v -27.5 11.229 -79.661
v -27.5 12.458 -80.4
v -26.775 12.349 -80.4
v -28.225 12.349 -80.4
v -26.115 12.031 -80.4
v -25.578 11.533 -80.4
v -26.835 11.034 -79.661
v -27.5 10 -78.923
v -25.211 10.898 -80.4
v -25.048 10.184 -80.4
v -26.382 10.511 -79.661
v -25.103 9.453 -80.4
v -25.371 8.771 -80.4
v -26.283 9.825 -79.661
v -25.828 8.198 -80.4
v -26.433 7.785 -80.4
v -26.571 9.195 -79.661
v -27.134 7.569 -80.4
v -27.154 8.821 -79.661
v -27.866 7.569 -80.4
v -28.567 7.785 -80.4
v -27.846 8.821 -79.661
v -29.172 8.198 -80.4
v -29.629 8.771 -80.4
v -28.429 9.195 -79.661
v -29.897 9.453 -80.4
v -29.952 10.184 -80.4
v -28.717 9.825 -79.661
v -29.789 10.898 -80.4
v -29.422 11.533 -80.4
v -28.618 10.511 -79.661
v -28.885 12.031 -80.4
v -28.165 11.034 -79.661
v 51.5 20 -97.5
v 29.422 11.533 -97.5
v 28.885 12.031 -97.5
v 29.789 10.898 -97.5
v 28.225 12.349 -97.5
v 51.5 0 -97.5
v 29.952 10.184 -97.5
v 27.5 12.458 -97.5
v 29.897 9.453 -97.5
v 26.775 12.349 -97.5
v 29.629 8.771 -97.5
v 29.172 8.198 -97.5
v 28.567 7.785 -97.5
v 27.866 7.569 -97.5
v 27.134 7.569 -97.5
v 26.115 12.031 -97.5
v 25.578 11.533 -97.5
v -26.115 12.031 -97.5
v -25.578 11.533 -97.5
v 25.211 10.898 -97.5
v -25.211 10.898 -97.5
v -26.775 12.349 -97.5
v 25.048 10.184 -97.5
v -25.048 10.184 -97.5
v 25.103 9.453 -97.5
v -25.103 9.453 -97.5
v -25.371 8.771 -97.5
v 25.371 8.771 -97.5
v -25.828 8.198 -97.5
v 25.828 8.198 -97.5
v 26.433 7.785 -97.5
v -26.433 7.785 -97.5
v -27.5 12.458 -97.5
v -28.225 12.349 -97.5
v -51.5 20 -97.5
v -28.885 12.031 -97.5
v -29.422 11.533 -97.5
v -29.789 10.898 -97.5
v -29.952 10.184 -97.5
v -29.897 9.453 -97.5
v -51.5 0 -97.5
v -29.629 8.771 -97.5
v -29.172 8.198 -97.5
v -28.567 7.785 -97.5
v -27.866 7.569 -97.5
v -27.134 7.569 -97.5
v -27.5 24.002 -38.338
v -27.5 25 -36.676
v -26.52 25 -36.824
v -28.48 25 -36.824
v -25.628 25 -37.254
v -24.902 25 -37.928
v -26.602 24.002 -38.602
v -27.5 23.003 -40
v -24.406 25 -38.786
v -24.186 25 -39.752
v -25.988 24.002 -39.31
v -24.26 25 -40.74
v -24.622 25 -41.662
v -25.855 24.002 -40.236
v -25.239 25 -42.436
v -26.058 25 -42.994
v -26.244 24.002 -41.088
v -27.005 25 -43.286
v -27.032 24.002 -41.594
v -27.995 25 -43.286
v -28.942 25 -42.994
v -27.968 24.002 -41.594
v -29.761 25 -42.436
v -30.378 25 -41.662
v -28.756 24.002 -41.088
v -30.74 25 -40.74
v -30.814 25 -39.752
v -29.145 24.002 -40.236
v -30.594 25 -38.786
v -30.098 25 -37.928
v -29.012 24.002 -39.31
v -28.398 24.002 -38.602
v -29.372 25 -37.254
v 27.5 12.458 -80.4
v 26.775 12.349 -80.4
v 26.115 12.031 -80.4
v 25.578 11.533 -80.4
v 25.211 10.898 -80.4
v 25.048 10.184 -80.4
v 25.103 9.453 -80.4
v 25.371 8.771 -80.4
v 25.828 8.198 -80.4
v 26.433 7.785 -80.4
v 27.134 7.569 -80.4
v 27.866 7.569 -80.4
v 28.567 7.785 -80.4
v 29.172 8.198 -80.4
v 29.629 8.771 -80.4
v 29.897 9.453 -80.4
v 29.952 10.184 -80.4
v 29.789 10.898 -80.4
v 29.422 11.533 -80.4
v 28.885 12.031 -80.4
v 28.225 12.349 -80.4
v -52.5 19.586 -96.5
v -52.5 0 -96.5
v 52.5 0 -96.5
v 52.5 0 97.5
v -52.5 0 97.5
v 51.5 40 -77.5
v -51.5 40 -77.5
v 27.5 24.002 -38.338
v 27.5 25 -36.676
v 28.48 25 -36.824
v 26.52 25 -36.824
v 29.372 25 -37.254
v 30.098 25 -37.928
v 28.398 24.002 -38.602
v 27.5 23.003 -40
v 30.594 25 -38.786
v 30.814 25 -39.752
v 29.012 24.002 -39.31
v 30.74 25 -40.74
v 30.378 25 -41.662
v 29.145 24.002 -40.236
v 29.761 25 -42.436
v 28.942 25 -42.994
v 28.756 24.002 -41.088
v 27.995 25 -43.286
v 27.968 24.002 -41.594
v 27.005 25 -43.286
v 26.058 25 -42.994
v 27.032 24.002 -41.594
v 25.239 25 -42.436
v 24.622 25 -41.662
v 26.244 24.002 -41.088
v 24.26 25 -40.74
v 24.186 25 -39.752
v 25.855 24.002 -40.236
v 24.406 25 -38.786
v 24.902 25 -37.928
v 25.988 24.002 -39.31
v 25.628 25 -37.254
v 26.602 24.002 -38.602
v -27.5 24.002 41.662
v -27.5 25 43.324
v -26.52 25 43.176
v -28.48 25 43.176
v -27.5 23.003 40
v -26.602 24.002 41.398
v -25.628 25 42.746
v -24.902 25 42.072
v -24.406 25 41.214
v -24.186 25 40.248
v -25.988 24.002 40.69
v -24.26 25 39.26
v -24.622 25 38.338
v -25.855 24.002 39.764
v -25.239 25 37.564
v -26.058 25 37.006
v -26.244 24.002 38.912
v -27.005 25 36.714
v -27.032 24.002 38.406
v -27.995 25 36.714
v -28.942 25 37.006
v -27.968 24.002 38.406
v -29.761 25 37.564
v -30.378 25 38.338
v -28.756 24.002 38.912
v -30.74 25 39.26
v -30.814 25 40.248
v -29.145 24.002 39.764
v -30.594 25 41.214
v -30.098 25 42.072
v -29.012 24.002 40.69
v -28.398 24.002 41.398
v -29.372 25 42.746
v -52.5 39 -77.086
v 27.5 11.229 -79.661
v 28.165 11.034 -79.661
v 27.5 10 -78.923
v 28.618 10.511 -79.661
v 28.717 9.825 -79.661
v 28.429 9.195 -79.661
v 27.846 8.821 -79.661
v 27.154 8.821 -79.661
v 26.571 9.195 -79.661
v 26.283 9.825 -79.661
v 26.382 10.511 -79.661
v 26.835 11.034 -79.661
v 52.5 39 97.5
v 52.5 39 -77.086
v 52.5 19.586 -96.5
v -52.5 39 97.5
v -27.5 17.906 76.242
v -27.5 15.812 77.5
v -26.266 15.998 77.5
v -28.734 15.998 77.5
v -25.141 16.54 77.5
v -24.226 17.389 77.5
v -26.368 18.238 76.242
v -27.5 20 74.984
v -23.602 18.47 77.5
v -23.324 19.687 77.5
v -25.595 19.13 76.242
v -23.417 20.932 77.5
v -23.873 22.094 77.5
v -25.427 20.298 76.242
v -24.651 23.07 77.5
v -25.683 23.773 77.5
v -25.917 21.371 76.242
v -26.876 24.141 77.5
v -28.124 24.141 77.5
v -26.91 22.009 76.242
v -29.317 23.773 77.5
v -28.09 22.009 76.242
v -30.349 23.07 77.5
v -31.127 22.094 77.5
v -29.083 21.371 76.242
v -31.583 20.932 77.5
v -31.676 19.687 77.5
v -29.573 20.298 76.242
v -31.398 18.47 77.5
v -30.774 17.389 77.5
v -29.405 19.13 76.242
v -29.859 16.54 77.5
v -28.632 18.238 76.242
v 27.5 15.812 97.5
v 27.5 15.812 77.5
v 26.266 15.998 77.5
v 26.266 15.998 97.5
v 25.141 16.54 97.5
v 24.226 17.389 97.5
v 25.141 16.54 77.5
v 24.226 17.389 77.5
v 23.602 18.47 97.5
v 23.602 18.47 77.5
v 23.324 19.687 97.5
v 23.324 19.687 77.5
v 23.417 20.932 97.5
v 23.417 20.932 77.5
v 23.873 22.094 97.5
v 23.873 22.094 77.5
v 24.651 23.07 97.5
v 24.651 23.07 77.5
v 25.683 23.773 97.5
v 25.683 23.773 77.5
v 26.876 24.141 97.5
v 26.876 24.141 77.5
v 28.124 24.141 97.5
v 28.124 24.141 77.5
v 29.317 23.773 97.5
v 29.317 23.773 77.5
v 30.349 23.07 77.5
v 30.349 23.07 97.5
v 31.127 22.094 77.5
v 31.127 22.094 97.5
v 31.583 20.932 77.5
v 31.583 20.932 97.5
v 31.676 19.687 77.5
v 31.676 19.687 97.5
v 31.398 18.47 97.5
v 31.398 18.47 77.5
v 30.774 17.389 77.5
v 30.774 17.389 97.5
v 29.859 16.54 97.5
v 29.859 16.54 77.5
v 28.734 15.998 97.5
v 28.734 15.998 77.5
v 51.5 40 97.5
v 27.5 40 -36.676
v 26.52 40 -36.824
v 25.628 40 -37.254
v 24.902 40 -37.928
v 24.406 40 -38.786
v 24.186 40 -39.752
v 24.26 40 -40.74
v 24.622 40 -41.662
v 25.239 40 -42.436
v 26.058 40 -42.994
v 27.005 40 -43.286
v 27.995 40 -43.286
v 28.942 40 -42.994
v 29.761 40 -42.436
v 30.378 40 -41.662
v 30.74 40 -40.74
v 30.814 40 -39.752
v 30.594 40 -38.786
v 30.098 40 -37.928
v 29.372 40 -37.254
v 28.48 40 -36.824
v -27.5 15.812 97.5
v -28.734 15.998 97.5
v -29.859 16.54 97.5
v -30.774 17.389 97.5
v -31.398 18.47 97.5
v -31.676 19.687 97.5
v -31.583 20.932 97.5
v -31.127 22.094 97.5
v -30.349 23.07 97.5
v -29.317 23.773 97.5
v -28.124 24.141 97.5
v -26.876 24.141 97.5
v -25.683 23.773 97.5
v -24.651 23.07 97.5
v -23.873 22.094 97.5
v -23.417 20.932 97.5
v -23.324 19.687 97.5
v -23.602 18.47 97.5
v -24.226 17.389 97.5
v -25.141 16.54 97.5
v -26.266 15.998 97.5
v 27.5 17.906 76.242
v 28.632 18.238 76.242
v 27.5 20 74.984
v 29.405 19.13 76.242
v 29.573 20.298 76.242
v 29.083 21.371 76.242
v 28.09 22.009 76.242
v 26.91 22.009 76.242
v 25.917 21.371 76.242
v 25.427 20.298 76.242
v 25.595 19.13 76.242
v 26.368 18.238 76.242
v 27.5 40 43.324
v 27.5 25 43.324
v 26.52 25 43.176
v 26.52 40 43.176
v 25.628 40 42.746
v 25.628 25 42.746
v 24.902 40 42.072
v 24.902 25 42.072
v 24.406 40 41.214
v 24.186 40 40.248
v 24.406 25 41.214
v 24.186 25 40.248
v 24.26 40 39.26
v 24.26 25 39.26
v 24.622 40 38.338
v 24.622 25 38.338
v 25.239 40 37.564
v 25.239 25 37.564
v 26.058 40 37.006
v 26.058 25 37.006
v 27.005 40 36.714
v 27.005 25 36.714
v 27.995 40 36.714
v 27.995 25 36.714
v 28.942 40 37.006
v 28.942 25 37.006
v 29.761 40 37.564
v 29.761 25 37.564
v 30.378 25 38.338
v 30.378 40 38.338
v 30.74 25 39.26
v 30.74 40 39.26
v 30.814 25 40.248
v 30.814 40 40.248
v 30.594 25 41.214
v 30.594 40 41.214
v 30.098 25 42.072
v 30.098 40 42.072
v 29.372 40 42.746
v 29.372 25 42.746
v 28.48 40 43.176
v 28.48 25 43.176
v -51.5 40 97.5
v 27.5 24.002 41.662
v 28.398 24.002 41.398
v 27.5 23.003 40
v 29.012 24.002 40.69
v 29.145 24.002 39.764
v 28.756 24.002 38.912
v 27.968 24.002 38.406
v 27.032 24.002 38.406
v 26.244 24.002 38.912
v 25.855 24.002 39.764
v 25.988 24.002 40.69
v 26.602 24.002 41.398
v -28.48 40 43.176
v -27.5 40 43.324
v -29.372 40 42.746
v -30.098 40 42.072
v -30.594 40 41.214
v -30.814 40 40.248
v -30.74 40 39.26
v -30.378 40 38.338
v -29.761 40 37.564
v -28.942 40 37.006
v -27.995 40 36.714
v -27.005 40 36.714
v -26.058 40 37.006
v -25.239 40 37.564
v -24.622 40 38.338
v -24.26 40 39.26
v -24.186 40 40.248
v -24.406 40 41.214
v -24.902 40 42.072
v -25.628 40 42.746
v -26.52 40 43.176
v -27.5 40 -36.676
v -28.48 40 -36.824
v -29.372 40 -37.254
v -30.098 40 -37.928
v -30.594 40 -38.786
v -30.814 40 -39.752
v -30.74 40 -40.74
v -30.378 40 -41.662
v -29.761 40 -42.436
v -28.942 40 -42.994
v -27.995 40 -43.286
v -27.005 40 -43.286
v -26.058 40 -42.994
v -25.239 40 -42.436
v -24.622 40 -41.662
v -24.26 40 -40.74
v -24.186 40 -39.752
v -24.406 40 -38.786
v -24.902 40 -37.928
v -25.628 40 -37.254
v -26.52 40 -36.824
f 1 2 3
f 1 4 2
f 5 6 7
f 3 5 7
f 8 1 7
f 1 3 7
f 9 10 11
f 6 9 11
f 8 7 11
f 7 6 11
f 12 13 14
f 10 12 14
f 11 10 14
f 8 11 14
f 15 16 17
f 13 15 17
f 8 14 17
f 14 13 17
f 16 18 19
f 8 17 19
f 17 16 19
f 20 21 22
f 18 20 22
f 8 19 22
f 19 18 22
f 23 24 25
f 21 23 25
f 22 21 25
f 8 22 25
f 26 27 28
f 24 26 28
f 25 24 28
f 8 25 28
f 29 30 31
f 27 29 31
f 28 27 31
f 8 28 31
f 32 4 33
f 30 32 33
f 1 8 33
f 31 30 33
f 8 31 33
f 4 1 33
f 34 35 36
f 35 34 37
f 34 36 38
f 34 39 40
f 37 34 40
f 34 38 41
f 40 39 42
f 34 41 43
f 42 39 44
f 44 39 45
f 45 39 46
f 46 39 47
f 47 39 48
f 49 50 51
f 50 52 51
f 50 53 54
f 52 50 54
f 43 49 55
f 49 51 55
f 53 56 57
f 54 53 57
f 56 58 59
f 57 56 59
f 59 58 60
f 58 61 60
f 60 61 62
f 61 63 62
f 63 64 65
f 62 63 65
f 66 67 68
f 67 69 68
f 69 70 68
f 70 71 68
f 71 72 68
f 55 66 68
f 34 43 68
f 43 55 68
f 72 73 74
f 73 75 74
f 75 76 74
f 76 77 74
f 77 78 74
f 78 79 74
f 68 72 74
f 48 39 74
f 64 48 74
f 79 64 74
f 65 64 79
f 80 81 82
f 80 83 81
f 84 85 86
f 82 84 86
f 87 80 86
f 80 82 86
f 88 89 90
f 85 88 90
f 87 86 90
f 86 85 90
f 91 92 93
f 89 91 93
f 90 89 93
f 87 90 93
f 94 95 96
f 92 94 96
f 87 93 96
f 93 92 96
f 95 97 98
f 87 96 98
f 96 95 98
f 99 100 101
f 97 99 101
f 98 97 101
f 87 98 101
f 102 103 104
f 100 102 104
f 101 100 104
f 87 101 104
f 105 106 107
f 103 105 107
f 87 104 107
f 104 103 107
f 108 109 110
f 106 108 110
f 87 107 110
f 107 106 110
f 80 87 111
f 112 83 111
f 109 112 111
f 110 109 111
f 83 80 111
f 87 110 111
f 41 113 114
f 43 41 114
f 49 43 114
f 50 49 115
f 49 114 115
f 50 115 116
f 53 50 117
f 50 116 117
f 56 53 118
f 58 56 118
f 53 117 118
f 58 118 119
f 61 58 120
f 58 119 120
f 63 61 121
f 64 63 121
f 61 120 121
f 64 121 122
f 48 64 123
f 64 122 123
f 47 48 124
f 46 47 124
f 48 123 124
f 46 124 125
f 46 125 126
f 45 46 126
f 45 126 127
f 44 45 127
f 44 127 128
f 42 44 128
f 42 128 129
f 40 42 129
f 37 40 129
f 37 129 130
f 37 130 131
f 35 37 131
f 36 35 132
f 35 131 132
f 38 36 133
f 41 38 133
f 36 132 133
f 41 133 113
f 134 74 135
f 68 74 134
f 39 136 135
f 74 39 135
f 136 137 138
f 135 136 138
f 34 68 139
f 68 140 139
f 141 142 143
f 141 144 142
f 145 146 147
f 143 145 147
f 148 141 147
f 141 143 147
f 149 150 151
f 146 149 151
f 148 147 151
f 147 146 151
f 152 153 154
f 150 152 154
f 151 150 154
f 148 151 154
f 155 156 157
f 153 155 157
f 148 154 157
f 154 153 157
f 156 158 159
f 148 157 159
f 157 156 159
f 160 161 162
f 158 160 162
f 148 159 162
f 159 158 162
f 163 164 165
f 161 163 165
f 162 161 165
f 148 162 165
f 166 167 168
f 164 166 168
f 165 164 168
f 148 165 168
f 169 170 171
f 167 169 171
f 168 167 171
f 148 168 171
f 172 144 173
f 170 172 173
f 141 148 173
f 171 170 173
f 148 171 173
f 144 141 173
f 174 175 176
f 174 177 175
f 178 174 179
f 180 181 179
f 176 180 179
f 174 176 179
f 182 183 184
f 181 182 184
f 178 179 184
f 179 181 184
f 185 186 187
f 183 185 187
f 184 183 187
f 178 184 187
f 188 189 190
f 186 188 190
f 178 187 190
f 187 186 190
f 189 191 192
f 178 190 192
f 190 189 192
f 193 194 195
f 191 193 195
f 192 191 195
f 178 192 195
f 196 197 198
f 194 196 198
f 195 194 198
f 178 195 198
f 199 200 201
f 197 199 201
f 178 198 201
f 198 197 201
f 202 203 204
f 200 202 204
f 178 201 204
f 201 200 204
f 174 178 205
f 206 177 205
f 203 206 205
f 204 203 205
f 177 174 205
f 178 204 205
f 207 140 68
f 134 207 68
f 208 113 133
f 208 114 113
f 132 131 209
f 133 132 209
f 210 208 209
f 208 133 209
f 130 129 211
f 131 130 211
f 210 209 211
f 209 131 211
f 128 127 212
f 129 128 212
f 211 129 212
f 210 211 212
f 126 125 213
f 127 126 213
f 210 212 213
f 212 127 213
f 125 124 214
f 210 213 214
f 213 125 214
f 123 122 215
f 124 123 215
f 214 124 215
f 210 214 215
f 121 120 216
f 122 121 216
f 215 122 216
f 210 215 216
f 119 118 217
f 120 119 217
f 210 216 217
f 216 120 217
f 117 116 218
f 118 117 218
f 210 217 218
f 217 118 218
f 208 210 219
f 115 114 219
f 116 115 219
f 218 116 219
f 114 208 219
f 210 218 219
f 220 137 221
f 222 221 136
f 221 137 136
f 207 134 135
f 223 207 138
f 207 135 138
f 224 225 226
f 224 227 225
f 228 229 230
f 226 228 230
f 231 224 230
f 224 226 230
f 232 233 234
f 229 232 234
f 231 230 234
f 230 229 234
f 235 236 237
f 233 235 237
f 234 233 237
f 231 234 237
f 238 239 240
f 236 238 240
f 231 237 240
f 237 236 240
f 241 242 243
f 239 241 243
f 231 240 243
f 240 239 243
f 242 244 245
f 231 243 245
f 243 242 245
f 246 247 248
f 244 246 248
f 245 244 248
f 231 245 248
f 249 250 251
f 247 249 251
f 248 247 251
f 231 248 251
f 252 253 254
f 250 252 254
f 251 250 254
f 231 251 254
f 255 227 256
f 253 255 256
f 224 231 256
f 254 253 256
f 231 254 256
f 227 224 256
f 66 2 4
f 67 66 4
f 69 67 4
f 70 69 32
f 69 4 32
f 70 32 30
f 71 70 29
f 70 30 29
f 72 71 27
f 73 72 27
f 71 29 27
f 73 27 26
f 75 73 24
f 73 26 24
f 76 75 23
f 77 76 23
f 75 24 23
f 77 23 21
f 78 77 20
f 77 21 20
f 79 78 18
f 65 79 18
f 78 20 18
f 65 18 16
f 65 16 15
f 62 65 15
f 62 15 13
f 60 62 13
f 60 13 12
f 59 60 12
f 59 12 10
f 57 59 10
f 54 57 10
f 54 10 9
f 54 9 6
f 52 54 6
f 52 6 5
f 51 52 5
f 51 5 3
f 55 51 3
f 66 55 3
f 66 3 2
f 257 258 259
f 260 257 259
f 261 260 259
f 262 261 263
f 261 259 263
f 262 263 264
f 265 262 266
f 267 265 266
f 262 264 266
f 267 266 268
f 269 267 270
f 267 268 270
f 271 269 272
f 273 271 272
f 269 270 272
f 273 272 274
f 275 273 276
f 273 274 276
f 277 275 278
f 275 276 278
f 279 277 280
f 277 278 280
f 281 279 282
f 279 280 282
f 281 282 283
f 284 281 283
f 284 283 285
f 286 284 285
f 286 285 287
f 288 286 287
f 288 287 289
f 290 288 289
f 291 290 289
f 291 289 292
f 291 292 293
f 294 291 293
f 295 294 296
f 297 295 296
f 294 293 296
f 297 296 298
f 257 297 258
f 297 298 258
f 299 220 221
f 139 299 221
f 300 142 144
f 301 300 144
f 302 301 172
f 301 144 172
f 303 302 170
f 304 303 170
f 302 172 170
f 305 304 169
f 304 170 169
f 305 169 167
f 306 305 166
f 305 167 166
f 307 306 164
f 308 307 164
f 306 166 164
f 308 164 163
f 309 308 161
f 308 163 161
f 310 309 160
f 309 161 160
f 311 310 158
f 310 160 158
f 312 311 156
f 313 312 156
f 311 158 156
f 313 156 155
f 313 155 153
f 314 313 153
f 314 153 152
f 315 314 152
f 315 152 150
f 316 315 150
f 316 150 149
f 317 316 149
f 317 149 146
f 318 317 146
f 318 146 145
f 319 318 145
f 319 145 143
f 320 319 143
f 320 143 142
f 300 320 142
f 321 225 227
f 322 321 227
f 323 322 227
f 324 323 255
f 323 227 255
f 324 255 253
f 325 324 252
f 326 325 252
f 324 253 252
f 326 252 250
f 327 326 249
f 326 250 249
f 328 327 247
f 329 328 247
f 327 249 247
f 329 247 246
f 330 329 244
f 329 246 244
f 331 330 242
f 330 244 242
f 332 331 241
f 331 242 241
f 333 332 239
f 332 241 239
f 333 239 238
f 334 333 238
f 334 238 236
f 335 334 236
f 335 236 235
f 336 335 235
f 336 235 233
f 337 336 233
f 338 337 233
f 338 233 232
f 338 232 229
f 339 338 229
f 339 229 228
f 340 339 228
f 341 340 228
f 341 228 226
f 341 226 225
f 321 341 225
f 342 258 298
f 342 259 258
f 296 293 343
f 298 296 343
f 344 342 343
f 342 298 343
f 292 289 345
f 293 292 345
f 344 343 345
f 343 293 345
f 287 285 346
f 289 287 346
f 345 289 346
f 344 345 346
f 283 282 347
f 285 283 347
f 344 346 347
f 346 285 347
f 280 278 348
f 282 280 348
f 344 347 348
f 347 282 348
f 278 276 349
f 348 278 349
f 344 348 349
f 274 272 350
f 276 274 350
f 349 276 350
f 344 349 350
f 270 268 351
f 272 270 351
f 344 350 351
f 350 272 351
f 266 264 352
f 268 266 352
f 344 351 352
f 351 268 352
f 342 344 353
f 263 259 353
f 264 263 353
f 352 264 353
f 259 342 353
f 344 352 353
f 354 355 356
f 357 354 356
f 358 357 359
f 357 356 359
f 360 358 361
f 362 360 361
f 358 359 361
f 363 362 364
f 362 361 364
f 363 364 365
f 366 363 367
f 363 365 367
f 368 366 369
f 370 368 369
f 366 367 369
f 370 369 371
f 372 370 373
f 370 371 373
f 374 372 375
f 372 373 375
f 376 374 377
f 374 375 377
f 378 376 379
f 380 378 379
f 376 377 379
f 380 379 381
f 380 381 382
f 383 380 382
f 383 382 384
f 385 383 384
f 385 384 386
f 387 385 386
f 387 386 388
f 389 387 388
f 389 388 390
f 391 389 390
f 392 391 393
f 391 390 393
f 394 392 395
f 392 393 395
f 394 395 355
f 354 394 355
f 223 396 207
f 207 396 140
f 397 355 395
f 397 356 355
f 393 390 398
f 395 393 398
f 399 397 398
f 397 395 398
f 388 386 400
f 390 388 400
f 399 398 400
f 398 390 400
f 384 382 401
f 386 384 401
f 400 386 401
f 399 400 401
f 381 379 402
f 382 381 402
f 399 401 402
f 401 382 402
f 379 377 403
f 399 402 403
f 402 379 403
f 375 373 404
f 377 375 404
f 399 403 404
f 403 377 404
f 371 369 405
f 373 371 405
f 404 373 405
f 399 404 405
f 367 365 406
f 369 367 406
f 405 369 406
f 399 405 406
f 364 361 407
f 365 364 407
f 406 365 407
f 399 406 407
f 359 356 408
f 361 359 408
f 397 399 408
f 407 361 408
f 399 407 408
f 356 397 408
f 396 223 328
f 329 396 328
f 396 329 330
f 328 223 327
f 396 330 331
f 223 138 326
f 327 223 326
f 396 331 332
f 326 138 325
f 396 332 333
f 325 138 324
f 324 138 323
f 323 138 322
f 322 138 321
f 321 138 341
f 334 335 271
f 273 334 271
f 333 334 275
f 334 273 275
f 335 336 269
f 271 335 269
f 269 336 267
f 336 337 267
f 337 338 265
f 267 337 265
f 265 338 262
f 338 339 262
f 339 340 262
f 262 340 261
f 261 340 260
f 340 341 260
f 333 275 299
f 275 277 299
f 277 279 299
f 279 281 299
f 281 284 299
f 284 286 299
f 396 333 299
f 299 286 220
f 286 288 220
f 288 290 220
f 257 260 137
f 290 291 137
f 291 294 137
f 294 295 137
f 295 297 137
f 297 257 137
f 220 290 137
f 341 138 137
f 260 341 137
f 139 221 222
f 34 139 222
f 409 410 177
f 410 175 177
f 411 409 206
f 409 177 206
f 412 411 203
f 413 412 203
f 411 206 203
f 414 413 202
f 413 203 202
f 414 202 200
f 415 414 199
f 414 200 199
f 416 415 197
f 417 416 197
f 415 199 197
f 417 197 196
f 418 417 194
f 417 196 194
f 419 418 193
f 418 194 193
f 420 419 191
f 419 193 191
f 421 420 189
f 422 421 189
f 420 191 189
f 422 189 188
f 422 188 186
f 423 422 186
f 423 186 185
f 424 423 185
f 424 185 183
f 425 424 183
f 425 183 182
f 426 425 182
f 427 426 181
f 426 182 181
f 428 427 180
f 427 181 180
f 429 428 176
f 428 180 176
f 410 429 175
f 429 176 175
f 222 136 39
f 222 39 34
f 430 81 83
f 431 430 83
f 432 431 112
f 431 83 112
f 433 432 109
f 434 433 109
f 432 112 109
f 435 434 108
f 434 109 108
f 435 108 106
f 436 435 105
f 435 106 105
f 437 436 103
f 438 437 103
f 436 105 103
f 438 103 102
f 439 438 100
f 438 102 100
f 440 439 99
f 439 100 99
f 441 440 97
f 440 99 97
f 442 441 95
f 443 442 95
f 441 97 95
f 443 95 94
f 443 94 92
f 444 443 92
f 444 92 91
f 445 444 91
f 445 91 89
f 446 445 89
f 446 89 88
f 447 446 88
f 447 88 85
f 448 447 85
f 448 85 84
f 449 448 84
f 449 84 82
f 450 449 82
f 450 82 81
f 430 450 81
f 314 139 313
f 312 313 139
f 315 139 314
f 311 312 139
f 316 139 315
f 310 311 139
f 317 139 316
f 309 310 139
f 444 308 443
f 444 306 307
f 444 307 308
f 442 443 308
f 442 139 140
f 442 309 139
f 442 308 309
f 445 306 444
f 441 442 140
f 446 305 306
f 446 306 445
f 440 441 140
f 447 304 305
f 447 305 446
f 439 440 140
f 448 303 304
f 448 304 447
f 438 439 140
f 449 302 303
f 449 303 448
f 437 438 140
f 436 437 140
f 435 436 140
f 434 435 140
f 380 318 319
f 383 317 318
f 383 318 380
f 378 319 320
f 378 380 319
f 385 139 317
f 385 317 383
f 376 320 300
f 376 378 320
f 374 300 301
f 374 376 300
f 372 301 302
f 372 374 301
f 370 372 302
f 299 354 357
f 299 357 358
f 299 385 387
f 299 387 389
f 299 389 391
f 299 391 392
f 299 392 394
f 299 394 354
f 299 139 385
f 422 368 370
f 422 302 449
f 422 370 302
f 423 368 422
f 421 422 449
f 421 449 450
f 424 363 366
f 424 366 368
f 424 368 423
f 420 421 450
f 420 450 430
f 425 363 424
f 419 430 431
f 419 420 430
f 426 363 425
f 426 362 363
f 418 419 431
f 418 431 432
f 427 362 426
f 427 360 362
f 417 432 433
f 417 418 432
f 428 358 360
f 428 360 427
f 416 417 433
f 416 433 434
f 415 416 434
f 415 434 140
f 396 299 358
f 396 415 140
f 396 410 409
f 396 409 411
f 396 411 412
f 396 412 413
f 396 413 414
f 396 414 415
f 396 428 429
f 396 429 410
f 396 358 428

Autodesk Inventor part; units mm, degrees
ref_plane "YZ Plane" through (0, 0, 0) normal (1, 0, 0) x (0, 1, 0)
ref_plane "XZ Plane" through (0, 0, 0) normal (0, 1, 0) x (-1, 0, 0)
ref_plane "XY Plane" through (0, 0, 0) normal (0, 0, 1) x (1, 0, 0)
sketch "Sketch1" plane through (0, 0, 0) normal (0, 1, 0) x (-1, 0, 0)
  line L0 (52.5, 97.5) -> (-52.5, 97.5)
  line L1 (-52.5, 97.5) -> (-52.5, -97.5)
  line L2 (-52.5, -97.5) -> (52.5, -97.5)
  line L3 (52.5, -97.5) -> (52.5, 97.5)
  point P0 (0, 0)
  point P1 (0, -97.5)
  point P2 (-52.5, 0)
  dimension "d0" = 105
  dimension "d1" = 195
extrude "Extrusion1" add sketch "Sketch1" along normal blind 40
sketch "Sketch2" plane through (-52.5, 0, 97.5) normal (0, 0, 1) x (1, 0, 0)
  line L0 (0, 40) -> (105, 40)
  circle A0 centre (80, 20) radius 5
  circle A1 centre (25, 20) radius 5
  line L1 (105, 0) -> (105, 40) projected
  line L2 (0, 0) -> (105, 0) projected
  line L3 (52.5, 0) -> (52.5, -9.2371) construction
  point P0 (105, 20)
  dimension "d6" = 55
  dimension "d19" = 10
  dimension "d44" = 27.5
hole "Hole1" at (27.5, 20, 97.5) at (-27.5, 20, 97.5) direction (0, 0, -1) diameter 8.376 depth 20 tip angle 118 thread size "M10x1.5" class "6H" standard "ANSI Metric M Profile"
chamfer "Chamfer1" distance 20 angle 45 1 edges at (0, 40, -97.5)
sketch "Sketch3" plane through (52.5, 0, -97.5) normal (0, 0, -1) x (-1, 0, 0)
  line L0 (0, 20) -> (105, 20) projected
  line L1 (0, 0) -> (105, 0) projected
  circle A0 centre (25, 10) radius 4
  circle A1 centre (80, 10) radius 4
  point P0 (52.5, 0)
  dimension "d20" = 55
  dimension "d21" = 27.5
  dimension "d22" = 20
  dimension "d23" = 10
  dimension "d24" = 8
hole "Hole2" at (27.5, 10, -97.5) at (-27.5, 10, -97.5) direction (0, 0, 1) diameter 4.917 depth 17.1 tip angle 118 thread size "M6x1" class "6H" standard "ISO Metric profile"
sketch "Sketch4" plane through (0, 40, 0) normal (0, 1, 0) x (1, 0, 0)
  circle A0 centre (-27.5, 40) radius 4
  circle A1 centre (27.5, 40) radius 4
  circle A2 centre (-27.5, -40) radius 4
  circle A3 centre (27.5, -40) radius 4
  line L0 (-52.5, -97.5) -> (52.5, -97.5) projected
  point P0 (0, 0)
  dimension "d32" = 8
  dimension "d33" = 55
  dimension "d34" = 27.5
  dimension "d35" = 80
  dimension "d46" = 57.5
hole "Hole3" at (-27.5, 40, -40) at (27.5, 40, 40) at (-27.5, 40, 40) at (27.5, 40, -40) direction (0, -1, 0) diameter 6.647 depth 15 tip angle 118 thread size "M8x1.25" class "6H" standard "ISO Metric profile"
chamfer "Chamfer2" distance 1 angle 45 6 edges at (52.5, 40, 10) (-52.5, 40, 10) (-52.5, 30, -87.5) (52.5, 30, -87.5) (52.5, 10, -97.5) (-52.5, 10, -97.5)
equation "\"d44\" = 0.5 * d6"
equation "\"d21\" = 0.5 * d20"
equation "\"d23\" = 0.5 * d22"
equation "\"d34\" = 0.5 * d33"
properties part number "BC-10007" material "Aço Carbono AISI 1006"
